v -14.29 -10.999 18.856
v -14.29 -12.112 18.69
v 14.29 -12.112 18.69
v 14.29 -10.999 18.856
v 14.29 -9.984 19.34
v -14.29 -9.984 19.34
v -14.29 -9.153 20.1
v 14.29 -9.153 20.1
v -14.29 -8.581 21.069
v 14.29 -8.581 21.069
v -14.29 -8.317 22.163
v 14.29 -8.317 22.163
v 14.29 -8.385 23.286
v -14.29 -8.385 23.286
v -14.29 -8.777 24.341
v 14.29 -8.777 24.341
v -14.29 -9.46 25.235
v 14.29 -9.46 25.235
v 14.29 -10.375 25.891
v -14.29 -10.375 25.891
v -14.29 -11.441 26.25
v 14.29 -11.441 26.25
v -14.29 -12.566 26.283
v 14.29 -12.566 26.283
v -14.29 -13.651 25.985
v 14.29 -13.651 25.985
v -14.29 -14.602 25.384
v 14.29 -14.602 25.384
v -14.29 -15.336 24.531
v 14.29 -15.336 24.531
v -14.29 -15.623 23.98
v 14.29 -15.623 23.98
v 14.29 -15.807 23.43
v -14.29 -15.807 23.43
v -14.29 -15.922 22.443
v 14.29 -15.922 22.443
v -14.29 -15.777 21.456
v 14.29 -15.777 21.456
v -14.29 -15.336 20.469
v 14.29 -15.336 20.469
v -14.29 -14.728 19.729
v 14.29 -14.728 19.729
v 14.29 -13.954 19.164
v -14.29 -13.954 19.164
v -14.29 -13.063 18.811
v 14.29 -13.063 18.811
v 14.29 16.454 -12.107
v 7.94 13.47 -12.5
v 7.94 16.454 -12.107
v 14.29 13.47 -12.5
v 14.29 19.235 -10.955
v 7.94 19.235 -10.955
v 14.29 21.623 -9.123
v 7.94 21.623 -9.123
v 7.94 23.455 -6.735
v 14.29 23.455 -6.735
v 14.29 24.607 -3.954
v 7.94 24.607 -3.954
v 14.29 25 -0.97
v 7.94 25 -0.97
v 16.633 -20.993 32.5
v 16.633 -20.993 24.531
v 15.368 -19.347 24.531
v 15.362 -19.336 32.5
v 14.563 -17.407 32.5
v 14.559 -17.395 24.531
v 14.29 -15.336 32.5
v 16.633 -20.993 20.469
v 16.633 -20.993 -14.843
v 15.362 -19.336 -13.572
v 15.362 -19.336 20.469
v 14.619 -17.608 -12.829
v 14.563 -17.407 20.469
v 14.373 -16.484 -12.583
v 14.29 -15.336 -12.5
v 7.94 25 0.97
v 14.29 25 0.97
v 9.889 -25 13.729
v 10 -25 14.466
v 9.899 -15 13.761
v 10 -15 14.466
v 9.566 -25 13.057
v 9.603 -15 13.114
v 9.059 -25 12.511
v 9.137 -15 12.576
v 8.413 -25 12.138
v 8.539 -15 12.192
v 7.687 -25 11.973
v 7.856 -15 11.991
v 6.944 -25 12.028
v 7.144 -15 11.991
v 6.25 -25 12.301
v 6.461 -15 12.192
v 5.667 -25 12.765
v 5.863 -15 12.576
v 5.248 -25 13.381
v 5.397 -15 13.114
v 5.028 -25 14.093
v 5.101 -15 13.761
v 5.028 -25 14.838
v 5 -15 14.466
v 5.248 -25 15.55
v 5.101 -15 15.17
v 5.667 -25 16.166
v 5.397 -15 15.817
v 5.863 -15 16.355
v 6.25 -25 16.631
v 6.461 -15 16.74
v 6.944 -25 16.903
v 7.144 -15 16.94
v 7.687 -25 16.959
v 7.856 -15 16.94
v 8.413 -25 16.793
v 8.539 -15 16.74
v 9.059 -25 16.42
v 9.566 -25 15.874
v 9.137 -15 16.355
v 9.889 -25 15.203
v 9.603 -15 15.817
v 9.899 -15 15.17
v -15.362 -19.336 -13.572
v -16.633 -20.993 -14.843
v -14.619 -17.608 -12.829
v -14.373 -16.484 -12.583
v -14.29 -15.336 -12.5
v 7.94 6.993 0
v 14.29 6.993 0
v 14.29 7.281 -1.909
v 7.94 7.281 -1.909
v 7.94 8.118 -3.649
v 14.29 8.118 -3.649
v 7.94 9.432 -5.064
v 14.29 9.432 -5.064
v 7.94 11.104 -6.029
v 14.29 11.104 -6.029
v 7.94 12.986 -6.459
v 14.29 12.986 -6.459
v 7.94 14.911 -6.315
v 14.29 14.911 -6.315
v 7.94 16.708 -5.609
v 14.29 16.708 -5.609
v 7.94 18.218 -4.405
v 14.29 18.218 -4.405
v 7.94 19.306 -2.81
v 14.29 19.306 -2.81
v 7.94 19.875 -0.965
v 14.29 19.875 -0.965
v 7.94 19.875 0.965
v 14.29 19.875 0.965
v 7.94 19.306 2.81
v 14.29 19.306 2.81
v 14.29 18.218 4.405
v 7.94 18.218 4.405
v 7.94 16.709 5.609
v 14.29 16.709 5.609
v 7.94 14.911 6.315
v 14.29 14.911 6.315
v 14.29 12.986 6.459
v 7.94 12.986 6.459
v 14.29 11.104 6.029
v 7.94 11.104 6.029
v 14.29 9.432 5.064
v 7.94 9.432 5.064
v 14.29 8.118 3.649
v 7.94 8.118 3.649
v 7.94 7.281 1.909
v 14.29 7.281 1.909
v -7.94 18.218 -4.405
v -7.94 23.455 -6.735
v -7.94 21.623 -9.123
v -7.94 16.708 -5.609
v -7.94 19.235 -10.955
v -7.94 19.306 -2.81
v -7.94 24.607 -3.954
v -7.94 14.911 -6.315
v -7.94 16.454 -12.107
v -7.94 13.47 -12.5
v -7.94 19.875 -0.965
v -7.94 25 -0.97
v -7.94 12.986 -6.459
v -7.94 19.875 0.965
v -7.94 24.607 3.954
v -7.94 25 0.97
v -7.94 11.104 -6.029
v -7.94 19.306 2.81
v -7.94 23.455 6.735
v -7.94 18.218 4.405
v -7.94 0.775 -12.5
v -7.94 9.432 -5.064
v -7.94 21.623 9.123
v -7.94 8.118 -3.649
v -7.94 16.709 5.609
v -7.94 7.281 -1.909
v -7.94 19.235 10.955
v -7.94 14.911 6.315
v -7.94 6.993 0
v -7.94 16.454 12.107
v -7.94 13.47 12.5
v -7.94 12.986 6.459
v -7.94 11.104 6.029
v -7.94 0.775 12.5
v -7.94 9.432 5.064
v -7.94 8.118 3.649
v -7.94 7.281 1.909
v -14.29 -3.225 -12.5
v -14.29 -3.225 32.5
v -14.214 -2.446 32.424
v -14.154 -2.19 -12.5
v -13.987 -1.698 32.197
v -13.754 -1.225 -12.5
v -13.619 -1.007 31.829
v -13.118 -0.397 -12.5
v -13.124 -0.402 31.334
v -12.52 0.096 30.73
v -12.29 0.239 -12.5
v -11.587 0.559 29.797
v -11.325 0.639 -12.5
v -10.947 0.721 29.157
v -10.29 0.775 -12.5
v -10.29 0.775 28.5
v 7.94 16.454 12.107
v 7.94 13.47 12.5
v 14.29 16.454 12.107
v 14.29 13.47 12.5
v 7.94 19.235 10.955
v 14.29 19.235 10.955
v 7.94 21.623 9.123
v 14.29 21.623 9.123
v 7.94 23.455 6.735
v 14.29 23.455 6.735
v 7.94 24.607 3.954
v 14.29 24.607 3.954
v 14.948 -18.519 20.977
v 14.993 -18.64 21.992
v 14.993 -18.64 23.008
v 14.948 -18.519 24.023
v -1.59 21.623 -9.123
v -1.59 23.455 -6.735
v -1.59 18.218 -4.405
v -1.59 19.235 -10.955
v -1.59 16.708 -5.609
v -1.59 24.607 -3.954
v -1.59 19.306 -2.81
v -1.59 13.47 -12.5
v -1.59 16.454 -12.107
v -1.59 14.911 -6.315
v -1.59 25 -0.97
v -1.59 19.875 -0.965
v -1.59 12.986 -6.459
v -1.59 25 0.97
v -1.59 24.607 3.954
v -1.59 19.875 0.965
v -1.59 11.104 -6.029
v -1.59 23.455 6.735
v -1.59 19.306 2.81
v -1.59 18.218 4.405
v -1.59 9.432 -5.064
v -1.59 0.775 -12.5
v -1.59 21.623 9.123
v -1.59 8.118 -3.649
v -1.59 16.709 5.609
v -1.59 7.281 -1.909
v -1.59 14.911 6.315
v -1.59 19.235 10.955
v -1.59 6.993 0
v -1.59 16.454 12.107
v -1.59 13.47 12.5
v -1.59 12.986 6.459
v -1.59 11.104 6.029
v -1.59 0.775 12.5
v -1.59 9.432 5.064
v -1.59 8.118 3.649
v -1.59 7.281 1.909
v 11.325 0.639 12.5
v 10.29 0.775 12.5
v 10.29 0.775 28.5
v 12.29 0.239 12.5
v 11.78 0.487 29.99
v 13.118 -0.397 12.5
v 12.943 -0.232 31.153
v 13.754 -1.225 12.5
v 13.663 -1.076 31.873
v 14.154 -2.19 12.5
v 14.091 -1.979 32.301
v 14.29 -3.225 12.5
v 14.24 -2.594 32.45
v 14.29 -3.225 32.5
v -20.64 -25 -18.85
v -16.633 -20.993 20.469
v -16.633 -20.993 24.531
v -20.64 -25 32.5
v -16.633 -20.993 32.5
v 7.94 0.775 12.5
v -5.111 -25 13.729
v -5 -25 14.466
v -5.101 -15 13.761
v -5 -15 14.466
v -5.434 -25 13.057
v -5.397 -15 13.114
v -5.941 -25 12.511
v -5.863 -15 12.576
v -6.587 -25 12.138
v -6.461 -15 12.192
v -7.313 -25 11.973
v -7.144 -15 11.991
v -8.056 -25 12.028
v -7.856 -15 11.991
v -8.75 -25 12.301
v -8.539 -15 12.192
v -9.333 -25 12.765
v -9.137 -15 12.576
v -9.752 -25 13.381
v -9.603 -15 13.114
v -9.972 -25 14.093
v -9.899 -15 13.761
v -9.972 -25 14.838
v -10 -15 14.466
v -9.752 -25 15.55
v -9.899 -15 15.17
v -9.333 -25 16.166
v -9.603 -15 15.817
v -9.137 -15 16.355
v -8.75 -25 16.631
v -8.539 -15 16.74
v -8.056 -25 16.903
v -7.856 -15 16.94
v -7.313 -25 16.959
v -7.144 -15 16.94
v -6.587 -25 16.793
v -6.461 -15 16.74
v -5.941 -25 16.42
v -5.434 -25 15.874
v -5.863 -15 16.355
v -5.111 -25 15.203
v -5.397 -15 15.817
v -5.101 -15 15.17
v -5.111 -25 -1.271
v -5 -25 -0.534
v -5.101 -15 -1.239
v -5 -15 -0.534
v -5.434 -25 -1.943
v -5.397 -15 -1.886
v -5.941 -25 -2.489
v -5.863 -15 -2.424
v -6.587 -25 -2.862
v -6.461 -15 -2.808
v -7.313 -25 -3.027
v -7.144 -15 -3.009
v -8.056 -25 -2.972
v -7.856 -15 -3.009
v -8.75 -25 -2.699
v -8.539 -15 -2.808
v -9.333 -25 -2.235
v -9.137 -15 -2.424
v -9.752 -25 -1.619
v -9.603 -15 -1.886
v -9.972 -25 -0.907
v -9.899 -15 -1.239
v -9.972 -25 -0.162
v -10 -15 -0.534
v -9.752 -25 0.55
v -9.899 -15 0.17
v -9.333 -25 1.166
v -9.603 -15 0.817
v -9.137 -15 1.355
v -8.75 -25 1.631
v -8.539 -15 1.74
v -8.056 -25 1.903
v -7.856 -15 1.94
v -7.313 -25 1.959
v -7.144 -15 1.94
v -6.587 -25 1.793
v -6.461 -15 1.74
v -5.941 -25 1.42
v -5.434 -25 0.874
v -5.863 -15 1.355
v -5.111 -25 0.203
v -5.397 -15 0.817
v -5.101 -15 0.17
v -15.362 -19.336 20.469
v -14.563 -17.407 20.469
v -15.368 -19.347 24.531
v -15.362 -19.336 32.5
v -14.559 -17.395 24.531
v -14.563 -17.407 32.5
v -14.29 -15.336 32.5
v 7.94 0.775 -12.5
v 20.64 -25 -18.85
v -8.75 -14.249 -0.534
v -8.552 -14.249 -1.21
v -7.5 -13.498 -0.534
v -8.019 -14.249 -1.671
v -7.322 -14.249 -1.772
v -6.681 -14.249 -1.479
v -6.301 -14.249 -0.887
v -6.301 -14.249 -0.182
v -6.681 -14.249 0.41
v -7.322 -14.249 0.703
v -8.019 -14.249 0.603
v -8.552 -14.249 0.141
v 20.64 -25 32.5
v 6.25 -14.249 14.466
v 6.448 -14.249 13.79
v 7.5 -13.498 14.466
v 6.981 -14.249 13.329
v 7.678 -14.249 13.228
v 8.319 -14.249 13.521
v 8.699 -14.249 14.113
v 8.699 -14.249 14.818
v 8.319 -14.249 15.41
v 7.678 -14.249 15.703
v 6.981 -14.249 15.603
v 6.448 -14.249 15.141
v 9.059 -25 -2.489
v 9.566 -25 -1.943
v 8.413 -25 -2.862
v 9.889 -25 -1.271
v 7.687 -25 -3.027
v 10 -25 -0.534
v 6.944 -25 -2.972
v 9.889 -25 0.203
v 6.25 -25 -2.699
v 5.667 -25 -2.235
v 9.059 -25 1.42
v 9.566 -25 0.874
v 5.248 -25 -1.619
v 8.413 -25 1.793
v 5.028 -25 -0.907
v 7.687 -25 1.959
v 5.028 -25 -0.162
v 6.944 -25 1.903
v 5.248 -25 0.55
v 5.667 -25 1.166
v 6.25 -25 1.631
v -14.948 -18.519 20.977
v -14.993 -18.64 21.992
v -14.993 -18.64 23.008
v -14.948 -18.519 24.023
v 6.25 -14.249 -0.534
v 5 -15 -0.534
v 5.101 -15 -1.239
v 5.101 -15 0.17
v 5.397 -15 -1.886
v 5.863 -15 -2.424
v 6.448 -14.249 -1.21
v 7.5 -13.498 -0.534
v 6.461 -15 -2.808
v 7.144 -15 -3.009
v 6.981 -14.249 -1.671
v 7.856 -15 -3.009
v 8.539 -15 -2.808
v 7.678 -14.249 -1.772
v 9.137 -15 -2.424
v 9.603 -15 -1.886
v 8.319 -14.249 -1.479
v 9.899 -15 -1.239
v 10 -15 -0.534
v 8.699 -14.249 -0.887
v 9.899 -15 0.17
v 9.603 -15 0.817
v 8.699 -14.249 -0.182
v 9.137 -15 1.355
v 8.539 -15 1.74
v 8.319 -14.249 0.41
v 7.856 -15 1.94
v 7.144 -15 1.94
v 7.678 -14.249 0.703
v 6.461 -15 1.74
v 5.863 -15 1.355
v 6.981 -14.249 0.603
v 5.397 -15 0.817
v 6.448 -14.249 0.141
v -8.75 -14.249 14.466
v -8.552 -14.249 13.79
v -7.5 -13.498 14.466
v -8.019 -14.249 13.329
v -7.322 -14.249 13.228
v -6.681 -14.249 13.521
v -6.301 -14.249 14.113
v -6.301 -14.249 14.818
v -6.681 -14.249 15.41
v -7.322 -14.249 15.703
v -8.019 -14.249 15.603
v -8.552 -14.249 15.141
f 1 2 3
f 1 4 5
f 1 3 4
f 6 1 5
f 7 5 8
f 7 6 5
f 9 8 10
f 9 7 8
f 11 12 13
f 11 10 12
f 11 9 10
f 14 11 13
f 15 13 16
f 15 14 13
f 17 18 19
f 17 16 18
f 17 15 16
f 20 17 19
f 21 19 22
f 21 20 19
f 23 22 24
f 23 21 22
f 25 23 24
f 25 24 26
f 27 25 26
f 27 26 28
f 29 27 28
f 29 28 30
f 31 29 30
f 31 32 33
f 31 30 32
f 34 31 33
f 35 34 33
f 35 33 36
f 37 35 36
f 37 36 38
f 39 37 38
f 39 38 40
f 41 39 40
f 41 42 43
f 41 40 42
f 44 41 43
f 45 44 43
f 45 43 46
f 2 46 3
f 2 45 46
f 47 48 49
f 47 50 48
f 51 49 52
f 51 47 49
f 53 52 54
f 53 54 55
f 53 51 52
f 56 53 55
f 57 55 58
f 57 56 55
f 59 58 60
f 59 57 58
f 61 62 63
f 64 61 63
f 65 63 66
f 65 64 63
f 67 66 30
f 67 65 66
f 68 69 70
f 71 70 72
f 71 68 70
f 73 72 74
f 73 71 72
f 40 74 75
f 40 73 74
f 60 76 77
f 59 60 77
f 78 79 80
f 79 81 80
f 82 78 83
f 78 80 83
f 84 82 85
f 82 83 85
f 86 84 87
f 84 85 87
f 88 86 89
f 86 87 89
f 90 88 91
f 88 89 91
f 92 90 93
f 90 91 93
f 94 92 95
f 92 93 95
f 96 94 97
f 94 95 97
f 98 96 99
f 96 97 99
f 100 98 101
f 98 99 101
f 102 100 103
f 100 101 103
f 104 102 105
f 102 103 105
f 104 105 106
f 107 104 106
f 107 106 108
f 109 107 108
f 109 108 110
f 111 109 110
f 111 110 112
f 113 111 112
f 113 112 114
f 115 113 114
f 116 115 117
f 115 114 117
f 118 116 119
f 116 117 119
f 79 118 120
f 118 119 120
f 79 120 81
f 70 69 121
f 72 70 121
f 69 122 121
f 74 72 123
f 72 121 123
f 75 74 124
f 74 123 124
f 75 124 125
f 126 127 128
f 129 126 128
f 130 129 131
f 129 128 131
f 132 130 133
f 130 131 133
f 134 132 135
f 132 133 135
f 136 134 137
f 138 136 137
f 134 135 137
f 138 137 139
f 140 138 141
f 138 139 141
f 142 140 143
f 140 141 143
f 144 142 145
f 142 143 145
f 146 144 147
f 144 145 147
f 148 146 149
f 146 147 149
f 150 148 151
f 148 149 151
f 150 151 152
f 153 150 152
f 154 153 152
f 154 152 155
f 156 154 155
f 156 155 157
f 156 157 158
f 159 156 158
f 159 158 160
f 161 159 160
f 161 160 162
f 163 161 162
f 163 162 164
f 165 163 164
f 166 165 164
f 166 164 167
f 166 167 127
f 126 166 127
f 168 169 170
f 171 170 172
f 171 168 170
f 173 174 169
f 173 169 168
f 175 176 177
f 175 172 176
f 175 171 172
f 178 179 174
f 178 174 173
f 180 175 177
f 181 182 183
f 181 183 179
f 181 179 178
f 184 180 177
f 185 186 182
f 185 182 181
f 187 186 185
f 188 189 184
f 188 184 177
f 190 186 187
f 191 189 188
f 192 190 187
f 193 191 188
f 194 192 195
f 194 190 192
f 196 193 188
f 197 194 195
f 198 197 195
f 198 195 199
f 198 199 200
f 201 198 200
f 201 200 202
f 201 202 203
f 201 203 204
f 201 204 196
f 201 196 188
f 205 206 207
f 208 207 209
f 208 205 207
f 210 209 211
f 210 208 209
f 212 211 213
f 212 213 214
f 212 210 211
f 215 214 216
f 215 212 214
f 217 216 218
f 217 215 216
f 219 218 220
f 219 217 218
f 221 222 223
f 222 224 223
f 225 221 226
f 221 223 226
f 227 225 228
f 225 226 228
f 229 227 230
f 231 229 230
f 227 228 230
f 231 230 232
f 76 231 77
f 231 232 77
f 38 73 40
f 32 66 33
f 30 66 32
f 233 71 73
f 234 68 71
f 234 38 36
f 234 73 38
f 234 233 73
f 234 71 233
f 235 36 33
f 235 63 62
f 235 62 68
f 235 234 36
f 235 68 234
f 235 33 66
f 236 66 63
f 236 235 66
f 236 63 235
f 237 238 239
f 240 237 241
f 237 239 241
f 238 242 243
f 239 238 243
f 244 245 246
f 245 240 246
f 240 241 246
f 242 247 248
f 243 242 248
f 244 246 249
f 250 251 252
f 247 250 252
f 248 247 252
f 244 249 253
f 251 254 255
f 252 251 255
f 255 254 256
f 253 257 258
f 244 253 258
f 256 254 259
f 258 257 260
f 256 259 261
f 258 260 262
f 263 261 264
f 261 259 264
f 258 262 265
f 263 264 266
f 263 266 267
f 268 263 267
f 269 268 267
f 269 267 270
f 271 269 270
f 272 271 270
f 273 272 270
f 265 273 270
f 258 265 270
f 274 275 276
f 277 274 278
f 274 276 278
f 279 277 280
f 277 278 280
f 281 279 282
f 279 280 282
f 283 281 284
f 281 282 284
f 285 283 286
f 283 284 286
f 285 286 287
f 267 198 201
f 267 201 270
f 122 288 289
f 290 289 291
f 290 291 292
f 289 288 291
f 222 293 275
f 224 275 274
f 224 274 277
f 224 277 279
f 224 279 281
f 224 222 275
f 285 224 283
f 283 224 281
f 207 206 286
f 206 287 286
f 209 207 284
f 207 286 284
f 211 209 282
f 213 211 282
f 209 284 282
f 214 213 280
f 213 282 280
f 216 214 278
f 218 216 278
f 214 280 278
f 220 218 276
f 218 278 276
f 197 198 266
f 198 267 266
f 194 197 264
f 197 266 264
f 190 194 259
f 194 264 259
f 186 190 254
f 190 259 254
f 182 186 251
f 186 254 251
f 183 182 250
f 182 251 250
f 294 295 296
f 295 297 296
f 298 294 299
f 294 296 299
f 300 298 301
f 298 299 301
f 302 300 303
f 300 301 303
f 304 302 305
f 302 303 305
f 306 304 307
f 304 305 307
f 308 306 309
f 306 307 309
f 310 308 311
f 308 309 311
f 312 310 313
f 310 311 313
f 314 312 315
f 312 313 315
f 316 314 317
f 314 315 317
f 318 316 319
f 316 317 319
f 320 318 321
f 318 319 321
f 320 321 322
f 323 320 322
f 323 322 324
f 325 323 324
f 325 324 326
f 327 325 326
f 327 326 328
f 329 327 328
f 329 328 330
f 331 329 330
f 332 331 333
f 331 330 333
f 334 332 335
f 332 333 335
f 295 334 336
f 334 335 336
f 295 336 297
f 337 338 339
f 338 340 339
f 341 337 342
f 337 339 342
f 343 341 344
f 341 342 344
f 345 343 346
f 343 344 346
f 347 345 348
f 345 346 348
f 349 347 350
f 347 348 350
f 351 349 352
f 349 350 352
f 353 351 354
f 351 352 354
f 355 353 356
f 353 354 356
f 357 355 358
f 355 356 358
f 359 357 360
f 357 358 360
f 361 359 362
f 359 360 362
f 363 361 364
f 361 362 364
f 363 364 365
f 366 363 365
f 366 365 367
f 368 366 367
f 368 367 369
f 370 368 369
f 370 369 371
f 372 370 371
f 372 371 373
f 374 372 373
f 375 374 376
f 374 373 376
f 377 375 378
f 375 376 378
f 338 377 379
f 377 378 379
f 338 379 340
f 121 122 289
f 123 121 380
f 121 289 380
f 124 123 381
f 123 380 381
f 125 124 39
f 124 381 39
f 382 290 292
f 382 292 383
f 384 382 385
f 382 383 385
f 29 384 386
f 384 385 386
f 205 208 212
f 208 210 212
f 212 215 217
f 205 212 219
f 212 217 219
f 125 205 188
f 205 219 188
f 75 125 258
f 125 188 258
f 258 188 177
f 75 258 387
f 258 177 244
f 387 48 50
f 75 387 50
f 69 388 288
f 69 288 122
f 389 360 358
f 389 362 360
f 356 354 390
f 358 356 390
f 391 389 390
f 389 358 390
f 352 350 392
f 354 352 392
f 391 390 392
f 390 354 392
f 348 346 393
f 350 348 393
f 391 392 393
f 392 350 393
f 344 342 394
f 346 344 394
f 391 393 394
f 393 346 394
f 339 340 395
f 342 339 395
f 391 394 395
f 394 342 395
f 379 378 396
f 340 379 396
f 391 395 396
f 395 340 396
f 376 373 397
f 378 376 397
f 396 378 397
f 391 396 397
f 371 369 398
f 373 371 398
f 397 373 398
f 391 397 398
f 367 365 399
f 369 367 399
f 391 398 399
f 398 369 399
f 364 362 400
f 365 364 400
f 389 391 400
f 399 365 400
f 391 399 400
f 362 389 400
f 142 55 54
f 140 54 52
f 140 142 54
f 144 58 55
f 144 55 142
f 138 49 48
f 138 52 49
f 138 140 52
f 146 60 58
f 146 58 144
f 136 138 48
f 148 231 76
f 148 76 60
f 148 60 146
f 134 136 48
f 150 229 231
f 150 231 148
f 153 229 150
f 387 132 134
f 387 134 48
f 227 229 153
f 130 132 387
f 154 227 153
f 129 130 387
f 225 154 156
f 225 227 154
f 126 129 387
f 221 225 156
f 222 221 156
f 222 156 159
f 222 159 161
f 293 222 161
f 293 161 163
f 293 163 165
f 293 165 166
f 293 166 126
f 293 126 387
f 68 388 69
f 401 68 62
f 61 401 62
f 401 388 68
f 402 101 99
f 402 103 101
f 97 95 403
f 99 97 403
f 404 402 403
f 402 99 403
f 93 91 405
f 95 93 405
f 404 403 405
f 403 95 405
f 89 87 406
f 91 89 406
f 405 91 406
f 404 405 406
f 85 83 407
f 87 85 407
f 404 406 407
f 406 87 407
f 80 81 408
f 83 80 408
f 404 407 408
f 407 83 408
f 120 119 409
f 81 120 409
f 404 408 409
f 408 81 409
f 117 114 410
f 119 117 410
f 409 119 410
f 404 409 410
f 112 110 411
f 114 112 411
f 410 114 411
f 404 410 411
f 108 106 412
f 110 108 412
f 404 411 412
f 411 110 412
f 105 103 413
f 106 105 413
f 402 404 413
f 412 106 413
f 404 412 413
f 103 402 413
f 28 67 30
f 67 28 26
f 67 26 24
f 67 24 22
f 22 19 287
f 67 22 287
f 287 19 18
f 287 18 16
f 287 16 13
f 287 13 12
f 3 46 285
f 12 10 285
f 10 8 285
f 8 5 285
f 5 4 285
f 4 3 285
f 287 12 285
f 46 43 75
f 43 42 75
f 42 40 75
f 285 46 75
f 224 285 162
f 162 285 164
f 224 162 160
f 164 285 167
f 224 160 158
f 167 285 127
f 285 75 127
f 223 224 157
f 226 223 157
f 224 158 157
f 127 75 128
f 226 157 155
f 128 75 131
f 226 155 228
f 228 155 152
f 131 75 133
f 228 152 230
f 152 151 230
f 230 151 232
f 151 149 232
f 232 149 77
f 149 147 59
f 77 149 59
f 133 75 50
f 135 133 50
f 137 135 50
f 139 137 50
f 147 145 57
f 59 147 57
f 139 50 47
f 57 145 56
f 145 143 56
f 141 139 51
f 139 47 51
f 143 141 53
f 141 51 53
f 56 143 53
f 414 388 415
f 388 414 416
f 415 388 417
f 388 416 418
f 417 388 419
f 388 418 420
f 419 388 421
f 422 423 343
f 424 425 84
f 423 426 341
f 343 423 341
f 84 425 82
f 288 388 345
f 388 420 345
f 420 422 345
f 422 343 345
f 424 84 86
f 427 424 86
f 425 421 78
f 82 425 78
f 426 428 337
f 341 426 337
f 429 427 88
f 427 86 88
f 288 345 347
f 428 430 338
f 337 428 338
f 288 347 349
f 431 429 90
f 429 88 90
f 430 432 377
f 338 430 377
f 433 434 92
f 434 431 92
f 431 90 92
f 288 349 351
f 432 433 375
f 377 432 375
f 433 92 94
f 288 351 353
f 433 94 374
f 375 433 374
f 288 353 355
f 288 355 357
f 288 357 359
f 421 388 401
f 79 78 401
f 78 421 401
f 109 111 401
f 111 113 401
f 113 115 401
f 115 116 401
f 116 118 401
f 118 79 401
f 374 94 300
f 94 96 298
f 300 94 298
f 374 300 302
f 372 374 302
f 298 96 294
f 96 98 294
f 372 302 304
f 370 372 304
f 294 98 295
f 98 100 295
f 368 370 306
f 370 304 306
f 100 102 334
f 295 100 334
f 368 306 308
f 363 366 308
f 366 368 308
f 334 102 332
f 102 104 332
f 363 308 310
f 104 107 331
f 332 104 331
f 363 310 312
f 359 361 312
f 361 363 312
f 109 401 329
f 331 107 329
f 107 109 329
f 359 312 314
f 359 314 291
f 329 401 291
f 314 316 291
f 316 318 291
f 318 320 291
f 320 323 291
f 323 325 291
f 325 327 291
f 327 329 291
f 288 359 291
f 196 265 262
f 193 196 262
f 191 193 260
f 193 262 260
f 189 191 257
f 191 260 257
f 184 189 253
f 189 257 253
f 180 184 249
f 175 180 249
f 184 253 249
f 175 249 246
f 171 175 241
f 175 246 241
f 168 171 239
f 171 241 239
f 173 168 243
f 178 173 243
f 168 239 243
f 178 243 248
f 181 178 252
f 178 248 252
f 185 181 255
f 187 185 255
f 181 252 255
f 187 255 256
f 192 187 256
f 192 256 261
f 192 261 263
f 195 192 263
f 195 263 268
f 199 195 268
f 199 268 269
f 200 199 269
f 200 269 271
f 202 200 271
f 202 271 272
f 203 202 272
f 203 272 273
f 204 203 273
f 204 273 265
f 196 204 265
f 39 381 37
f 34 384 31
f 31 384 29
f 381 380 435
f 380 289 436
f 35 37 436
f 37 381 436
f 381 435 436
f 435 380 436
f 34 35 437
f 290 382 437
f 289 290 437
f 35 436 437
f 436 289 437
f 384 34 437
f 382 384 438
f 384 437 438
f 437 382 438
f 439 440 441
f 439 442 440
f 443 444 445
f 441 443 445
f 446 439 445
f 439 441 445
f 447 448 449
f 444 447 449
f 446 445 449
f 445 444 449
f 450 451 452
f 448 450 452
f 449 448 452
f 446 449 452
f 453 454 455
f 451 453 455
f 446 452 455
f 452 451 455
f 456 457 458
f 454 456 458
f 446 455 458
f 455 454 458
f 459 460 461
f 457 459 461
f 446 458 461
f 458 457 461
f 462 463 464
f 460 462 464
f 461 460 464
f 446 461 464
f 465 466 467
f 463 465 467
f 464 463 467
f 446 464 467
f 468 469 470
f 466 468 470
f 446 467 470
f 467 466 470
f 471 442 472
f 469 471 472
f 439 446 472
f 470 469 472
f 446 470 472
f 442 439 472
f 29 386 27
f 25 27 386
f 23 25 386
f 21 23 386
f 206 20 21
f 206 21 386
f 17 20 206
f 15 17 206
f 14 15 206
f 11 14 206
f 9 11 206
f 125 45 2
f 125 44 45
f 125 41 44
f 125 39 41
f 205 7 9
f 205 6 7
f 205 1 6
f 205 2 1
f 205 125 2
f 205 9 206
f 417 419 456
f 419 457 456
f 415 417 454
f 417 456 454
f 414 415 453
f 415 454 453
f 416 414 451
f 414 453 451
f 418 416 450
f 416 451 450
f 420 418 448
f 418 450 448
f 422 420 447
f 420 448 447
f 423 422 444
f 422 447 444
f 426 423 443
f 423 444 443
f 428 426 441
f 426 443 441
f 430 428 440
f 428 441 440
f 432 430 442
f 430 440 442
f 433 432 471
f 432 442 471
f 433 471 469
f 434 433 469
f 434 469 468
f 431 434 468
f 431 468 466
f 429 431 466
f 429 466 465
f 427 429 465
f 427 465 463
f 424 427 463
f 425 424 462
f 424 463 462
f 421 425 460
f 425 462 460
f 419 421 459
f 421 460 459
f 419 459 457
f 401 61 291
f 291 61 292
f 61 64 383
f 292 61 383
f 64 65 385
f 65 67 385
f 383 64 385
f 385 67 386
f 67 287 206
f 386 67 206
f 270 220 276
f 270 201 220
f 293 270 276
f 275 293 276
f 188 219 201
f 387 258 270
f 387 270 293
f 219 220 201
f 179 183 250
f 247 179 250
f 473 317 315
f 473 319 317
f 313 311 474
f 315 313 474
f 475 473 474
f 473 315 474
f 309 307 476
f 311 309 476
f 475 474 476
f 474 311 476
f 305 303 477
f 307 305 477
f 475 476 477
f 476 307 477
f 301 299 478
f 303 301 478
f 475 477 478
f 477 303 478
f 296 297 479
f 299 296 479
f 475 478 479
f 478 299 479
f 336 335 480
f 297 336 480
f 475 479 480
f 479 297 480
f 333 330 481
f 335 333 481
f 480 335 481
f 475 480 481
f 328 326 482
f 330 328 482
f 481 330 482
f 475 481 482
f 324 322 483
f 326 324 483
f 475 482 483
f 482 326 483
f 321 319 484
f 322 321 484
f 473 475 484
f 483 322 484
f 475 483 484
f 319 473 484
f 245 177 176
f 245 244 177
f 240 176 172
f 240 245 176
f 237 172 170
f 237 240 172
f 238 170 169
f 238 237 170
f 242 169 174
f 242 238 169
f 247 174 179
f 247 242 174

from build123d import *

# Parameters (mm, degrees)
SKETCH1_W                       = 28.58
SKETCH1_H                       = 50
BOSS_EXTRUDE1_DEPTH             = 12.5
SKETCH2_W                       = 9.53
SKETCH2_H                       = 24.225
SKETCH2_W_2                     = 6.35
CUT_EXTRUDE1_DEPTH              = 39.134028111
FILLET1_R                       = 11.53
SKETCH3_R                       = 6.477
CUT_EXTRUDE2_DEPTH              = 40.975822693
BOSS_EXTRUDE2_DEPTH             = 28.58
SKETCH5_W                       = 28.58
SKETCH5_H                       = 25.775
BOSS_EXTRUDE3_DEPTH             = 20
CUT_EXTRUDE3_DEPTH              = 50.98066026
CUT_EXTRUDE3_DEPTH_BACK         = 50.98066026
SKETCH6_R                       = 3.81
BOSS_EXTRUDE4_REACH             = 55.425
BOSS_EXTRUDE4_DIRECTION_2_REACH = 55.425
F_5_0MM_DOWEL_HOLE1_D           = 5
F_5_0MM_DOWEL_HOLE1_DEPTH       = 10
F_5_0MM_DOWEL_HOLE1_TIP         = 1.502151548
FILLET2_R                       = 8
FILLET4_R                       = 4


with BuildPart() as part:
    # Sketch1 → Boss-Extrude1 (new, symmetric)
    with BuildSketch(Plane.XY):
        Rectangle(SKETCH1_W, SKETCH1_H)
    extrude(amount=BOSS_EXTRUDE1_DEPTH, both=True)

    # Sketch2 → Cut-Extrude1 (cut, through all)
    with BuildSketch(Plane(origin=(0, 0, 12.5), x_dir=(-1, 0, 0), z_dir=(0, 0, 1))):
        with Locations((-3.175, -12.8875)):
            Rectangle(SKETCH2_W, SKETCH2_H)
        with Locations((11.115, -12.8875)):
            Rectangle(SKETCH2_W_2, SKETCH2_H)
    extrude(amount=-CUT_EXTRUDE1_DEPTH, mode=Mode.SUBTRACT)

    # Fillet1
    fillet1_edges = [part.edges().sort_by_distance(p)[0] for p in [
        (-4.765, 25, -12.5),
        (-4.765, 25, 12.5),
        (11.115, 25, -12.5),
        (11.115, 25, 12.5),
    ]]
    fillet(fillet1_edges, radius=FILLET1_R)

    # Sketch3 → Cut-Extrude2 (cut, through all)
    with BuildSketch(Plane(origin=(14.29, 0, 0), x_dir=(0, 0, -1), z_dir=(1, 0, 0))):
        with Locations(Location((0, 13.47, 0), (0, 0, 270))):
            Circle(SKETCH3_R)
    extrude(amount=-CUT_EXTRUDE2_DEPTH, mode=Mode.SUBTRACT)

    # Sketch4 → Boss-Extrude2 (add)
    with BuildSketch(Plane(origin=(14.29, 0, 0), x_dir=(0, 0, -1), z_dir=(1, 0, 0))):
        Polygon((18.85, -25), (12.5, -18.65), (12.5, -25), align=None)
    extrude(amount=-BOSS_EXTRUDE2_DEPTH)

    # Sketch5 → Boss-Extrude3 (add)
    with BuildSketch(Plane.XY.offset(12.5)):
        with Locations((0, -12.1125)):
            Rectangle(SKETCH5_W, SKETCH5_H)
    extrude(amount=BOSS_EXTRUDE3_DEPTH)

    # Sketch6 → Cut-Extrude3 (cut, two sides: drawn at the far end of the back side and taken through both)
    with BuildSketch(Plane(origin=(14.29, 0, 0), x_dir=(0, 0, -1), z_dir=(1, 0, 0)).offset(-CUT_EXTRUDE3_DEPTH_BACK)):
        with Locations((-22.5, -12.1125)):
            Circle(SKETCH6_R)
    extrude(amount=CUT_EXTRUDE3_DEPTH + CUT_EXTRUDE3_DEPTH_BACK, mode=Mode.SUBTRACT)

    # Boss-Extrude4: up to this face of the body (flat: up to its plane)
    boss_extrude4_end = Plane(part.part.faces().sort_by_distance((0, -12.1125, 32.5))[0])
    # Sketch7 → Boss-Extrude4 (add, up to the picked face)
    with BuildSketch(Plane(origin=(0, 0, -12.5), x_dir=(-1, 0, 0), z_dir=(0, 0, -1)), mode=Mode.PRIVATE) as boss_extrude4_sk1:
        Polygon((-14.29, -25), (-20.64, -25), (-14.29, -18.65), align=None)
    boss_extrude4_tool1 = split(extrude(boss_extrude4_sk1.sketch, amount=-BOSS_EXTRUDE4_REACH, mode=Mode.PRIVATE), bisect_by=boss_extrude4_end, keep=Keep.BOTH, mode=Mode.PRIVATE)
    boss_extrude4 = boss_extrude4_tool1.solids().sort_by(Axis((16.406667, -22.883333, -12.5), (0, 0, 1)))[0]
    add(boss_extrude4)

    # Boss-Extrude4 direction 2: up to this face of the body (flat: up to its plane)
    boss_extrude4_direction_2_end = Plane(part.part.faces().sort_by_distance((0, -21.825, -15.675))[0])
    # Sketch7 → Boss-Extrude4 direction 2 (add, up to the picked face)
    with BuildSketch(Plane(origin=(0, 0, -12.5), x_dir=(-1, 0, 0), z_dir=(0, 0, -1)), mode=Mode.PRIVATE) as boss_extrude4_direction_2_sk1:
        Polygon((-14.29, -25), (-20.64, -25), (-14.29, -18.65), align=None)
    boss_extrude4_direction_2_tool1 = split(extrude(boss_extrude4_direction_2_sk1.sketch, amount=BOSS_EXTRUDE4_DIRECTION_2_REACH, mode=Mode.PRIVATE), bisect_by=boss_extrude4_direction_2_end, keep=Keep.BOTH, mode=Mode.PRIVATE)
    boss_extrude4_direction_2 = boss_extrude4_direction_2_tool1.solids().sort_by(Axis((16.406667, -22.883333, -12.5), (0, 0, -1)))[0]
    add(boss_extrude4_direction_2)

    # Mirror2: Boss-Extrude4, Boss-Extrude4 direction 2 across plane
    add(boss_extrude4.mirror(Plane(origin=(0, 0, 0), x_dir=(0, 0, 1), z_dir=(1, 0, 0))))
    add(boss_extrude4_direction_2.mirror(Plane(origin=(0, 0, 0), x_dir=(0, 0, 1), z_dir=(1, 0, 0))))

    # Ø5.0mm Dowel Hole1
    with Locations(Plane(origin=(0, -25, 0), x_dir=(-1, 0, 0), z_dir=(0, -1, 0))):
        with Locations((-7.5, 0.534345417), (7.5, 0.534345417), (7.5, -14.465654583), (-7.5, -14.465654583)):
            Hole(F_5_0MM_DOWEL_HOLE1_D / 2, depth=F_5_0MM_DOWEL_HOLE1_DEPTH)
            with Locations((0, 0, -(F_5_0MM_DOWEL_HOLE1_DEPTH + F_5_0MM_DOWEL_HOLE1_TIP / 2))):  # 118° drill point
                Cone(0, F_5_0MM_DOWEL_HOLE1_D / 2, F_5_0MM_DOWEL_HOLE1_TIP, mode=Mode.SUBTRACT)

    # Fillet2
    fillet2_edges = [part.edges().sort_by_distance(p)[0] for p in [
        (14.29, -18.65, 10),
        (-14.29, -18.65, 10),
        (0, -18.65, -12.5),
    ]]
    fillet(fillet2_edges, radius=FILLET2_R)

    # Fillet4
    fillet4_edges = [part.edges().sort_by_distance(p)[0] for p in [
        (-14.29, 0.775, 10),
        (14.29, 0.775, 22.5),
        (0, 0.775, 32.5),
    ]]
    fillet(fillet4_edges, radius=FILLET4_R)


solid = part.part
